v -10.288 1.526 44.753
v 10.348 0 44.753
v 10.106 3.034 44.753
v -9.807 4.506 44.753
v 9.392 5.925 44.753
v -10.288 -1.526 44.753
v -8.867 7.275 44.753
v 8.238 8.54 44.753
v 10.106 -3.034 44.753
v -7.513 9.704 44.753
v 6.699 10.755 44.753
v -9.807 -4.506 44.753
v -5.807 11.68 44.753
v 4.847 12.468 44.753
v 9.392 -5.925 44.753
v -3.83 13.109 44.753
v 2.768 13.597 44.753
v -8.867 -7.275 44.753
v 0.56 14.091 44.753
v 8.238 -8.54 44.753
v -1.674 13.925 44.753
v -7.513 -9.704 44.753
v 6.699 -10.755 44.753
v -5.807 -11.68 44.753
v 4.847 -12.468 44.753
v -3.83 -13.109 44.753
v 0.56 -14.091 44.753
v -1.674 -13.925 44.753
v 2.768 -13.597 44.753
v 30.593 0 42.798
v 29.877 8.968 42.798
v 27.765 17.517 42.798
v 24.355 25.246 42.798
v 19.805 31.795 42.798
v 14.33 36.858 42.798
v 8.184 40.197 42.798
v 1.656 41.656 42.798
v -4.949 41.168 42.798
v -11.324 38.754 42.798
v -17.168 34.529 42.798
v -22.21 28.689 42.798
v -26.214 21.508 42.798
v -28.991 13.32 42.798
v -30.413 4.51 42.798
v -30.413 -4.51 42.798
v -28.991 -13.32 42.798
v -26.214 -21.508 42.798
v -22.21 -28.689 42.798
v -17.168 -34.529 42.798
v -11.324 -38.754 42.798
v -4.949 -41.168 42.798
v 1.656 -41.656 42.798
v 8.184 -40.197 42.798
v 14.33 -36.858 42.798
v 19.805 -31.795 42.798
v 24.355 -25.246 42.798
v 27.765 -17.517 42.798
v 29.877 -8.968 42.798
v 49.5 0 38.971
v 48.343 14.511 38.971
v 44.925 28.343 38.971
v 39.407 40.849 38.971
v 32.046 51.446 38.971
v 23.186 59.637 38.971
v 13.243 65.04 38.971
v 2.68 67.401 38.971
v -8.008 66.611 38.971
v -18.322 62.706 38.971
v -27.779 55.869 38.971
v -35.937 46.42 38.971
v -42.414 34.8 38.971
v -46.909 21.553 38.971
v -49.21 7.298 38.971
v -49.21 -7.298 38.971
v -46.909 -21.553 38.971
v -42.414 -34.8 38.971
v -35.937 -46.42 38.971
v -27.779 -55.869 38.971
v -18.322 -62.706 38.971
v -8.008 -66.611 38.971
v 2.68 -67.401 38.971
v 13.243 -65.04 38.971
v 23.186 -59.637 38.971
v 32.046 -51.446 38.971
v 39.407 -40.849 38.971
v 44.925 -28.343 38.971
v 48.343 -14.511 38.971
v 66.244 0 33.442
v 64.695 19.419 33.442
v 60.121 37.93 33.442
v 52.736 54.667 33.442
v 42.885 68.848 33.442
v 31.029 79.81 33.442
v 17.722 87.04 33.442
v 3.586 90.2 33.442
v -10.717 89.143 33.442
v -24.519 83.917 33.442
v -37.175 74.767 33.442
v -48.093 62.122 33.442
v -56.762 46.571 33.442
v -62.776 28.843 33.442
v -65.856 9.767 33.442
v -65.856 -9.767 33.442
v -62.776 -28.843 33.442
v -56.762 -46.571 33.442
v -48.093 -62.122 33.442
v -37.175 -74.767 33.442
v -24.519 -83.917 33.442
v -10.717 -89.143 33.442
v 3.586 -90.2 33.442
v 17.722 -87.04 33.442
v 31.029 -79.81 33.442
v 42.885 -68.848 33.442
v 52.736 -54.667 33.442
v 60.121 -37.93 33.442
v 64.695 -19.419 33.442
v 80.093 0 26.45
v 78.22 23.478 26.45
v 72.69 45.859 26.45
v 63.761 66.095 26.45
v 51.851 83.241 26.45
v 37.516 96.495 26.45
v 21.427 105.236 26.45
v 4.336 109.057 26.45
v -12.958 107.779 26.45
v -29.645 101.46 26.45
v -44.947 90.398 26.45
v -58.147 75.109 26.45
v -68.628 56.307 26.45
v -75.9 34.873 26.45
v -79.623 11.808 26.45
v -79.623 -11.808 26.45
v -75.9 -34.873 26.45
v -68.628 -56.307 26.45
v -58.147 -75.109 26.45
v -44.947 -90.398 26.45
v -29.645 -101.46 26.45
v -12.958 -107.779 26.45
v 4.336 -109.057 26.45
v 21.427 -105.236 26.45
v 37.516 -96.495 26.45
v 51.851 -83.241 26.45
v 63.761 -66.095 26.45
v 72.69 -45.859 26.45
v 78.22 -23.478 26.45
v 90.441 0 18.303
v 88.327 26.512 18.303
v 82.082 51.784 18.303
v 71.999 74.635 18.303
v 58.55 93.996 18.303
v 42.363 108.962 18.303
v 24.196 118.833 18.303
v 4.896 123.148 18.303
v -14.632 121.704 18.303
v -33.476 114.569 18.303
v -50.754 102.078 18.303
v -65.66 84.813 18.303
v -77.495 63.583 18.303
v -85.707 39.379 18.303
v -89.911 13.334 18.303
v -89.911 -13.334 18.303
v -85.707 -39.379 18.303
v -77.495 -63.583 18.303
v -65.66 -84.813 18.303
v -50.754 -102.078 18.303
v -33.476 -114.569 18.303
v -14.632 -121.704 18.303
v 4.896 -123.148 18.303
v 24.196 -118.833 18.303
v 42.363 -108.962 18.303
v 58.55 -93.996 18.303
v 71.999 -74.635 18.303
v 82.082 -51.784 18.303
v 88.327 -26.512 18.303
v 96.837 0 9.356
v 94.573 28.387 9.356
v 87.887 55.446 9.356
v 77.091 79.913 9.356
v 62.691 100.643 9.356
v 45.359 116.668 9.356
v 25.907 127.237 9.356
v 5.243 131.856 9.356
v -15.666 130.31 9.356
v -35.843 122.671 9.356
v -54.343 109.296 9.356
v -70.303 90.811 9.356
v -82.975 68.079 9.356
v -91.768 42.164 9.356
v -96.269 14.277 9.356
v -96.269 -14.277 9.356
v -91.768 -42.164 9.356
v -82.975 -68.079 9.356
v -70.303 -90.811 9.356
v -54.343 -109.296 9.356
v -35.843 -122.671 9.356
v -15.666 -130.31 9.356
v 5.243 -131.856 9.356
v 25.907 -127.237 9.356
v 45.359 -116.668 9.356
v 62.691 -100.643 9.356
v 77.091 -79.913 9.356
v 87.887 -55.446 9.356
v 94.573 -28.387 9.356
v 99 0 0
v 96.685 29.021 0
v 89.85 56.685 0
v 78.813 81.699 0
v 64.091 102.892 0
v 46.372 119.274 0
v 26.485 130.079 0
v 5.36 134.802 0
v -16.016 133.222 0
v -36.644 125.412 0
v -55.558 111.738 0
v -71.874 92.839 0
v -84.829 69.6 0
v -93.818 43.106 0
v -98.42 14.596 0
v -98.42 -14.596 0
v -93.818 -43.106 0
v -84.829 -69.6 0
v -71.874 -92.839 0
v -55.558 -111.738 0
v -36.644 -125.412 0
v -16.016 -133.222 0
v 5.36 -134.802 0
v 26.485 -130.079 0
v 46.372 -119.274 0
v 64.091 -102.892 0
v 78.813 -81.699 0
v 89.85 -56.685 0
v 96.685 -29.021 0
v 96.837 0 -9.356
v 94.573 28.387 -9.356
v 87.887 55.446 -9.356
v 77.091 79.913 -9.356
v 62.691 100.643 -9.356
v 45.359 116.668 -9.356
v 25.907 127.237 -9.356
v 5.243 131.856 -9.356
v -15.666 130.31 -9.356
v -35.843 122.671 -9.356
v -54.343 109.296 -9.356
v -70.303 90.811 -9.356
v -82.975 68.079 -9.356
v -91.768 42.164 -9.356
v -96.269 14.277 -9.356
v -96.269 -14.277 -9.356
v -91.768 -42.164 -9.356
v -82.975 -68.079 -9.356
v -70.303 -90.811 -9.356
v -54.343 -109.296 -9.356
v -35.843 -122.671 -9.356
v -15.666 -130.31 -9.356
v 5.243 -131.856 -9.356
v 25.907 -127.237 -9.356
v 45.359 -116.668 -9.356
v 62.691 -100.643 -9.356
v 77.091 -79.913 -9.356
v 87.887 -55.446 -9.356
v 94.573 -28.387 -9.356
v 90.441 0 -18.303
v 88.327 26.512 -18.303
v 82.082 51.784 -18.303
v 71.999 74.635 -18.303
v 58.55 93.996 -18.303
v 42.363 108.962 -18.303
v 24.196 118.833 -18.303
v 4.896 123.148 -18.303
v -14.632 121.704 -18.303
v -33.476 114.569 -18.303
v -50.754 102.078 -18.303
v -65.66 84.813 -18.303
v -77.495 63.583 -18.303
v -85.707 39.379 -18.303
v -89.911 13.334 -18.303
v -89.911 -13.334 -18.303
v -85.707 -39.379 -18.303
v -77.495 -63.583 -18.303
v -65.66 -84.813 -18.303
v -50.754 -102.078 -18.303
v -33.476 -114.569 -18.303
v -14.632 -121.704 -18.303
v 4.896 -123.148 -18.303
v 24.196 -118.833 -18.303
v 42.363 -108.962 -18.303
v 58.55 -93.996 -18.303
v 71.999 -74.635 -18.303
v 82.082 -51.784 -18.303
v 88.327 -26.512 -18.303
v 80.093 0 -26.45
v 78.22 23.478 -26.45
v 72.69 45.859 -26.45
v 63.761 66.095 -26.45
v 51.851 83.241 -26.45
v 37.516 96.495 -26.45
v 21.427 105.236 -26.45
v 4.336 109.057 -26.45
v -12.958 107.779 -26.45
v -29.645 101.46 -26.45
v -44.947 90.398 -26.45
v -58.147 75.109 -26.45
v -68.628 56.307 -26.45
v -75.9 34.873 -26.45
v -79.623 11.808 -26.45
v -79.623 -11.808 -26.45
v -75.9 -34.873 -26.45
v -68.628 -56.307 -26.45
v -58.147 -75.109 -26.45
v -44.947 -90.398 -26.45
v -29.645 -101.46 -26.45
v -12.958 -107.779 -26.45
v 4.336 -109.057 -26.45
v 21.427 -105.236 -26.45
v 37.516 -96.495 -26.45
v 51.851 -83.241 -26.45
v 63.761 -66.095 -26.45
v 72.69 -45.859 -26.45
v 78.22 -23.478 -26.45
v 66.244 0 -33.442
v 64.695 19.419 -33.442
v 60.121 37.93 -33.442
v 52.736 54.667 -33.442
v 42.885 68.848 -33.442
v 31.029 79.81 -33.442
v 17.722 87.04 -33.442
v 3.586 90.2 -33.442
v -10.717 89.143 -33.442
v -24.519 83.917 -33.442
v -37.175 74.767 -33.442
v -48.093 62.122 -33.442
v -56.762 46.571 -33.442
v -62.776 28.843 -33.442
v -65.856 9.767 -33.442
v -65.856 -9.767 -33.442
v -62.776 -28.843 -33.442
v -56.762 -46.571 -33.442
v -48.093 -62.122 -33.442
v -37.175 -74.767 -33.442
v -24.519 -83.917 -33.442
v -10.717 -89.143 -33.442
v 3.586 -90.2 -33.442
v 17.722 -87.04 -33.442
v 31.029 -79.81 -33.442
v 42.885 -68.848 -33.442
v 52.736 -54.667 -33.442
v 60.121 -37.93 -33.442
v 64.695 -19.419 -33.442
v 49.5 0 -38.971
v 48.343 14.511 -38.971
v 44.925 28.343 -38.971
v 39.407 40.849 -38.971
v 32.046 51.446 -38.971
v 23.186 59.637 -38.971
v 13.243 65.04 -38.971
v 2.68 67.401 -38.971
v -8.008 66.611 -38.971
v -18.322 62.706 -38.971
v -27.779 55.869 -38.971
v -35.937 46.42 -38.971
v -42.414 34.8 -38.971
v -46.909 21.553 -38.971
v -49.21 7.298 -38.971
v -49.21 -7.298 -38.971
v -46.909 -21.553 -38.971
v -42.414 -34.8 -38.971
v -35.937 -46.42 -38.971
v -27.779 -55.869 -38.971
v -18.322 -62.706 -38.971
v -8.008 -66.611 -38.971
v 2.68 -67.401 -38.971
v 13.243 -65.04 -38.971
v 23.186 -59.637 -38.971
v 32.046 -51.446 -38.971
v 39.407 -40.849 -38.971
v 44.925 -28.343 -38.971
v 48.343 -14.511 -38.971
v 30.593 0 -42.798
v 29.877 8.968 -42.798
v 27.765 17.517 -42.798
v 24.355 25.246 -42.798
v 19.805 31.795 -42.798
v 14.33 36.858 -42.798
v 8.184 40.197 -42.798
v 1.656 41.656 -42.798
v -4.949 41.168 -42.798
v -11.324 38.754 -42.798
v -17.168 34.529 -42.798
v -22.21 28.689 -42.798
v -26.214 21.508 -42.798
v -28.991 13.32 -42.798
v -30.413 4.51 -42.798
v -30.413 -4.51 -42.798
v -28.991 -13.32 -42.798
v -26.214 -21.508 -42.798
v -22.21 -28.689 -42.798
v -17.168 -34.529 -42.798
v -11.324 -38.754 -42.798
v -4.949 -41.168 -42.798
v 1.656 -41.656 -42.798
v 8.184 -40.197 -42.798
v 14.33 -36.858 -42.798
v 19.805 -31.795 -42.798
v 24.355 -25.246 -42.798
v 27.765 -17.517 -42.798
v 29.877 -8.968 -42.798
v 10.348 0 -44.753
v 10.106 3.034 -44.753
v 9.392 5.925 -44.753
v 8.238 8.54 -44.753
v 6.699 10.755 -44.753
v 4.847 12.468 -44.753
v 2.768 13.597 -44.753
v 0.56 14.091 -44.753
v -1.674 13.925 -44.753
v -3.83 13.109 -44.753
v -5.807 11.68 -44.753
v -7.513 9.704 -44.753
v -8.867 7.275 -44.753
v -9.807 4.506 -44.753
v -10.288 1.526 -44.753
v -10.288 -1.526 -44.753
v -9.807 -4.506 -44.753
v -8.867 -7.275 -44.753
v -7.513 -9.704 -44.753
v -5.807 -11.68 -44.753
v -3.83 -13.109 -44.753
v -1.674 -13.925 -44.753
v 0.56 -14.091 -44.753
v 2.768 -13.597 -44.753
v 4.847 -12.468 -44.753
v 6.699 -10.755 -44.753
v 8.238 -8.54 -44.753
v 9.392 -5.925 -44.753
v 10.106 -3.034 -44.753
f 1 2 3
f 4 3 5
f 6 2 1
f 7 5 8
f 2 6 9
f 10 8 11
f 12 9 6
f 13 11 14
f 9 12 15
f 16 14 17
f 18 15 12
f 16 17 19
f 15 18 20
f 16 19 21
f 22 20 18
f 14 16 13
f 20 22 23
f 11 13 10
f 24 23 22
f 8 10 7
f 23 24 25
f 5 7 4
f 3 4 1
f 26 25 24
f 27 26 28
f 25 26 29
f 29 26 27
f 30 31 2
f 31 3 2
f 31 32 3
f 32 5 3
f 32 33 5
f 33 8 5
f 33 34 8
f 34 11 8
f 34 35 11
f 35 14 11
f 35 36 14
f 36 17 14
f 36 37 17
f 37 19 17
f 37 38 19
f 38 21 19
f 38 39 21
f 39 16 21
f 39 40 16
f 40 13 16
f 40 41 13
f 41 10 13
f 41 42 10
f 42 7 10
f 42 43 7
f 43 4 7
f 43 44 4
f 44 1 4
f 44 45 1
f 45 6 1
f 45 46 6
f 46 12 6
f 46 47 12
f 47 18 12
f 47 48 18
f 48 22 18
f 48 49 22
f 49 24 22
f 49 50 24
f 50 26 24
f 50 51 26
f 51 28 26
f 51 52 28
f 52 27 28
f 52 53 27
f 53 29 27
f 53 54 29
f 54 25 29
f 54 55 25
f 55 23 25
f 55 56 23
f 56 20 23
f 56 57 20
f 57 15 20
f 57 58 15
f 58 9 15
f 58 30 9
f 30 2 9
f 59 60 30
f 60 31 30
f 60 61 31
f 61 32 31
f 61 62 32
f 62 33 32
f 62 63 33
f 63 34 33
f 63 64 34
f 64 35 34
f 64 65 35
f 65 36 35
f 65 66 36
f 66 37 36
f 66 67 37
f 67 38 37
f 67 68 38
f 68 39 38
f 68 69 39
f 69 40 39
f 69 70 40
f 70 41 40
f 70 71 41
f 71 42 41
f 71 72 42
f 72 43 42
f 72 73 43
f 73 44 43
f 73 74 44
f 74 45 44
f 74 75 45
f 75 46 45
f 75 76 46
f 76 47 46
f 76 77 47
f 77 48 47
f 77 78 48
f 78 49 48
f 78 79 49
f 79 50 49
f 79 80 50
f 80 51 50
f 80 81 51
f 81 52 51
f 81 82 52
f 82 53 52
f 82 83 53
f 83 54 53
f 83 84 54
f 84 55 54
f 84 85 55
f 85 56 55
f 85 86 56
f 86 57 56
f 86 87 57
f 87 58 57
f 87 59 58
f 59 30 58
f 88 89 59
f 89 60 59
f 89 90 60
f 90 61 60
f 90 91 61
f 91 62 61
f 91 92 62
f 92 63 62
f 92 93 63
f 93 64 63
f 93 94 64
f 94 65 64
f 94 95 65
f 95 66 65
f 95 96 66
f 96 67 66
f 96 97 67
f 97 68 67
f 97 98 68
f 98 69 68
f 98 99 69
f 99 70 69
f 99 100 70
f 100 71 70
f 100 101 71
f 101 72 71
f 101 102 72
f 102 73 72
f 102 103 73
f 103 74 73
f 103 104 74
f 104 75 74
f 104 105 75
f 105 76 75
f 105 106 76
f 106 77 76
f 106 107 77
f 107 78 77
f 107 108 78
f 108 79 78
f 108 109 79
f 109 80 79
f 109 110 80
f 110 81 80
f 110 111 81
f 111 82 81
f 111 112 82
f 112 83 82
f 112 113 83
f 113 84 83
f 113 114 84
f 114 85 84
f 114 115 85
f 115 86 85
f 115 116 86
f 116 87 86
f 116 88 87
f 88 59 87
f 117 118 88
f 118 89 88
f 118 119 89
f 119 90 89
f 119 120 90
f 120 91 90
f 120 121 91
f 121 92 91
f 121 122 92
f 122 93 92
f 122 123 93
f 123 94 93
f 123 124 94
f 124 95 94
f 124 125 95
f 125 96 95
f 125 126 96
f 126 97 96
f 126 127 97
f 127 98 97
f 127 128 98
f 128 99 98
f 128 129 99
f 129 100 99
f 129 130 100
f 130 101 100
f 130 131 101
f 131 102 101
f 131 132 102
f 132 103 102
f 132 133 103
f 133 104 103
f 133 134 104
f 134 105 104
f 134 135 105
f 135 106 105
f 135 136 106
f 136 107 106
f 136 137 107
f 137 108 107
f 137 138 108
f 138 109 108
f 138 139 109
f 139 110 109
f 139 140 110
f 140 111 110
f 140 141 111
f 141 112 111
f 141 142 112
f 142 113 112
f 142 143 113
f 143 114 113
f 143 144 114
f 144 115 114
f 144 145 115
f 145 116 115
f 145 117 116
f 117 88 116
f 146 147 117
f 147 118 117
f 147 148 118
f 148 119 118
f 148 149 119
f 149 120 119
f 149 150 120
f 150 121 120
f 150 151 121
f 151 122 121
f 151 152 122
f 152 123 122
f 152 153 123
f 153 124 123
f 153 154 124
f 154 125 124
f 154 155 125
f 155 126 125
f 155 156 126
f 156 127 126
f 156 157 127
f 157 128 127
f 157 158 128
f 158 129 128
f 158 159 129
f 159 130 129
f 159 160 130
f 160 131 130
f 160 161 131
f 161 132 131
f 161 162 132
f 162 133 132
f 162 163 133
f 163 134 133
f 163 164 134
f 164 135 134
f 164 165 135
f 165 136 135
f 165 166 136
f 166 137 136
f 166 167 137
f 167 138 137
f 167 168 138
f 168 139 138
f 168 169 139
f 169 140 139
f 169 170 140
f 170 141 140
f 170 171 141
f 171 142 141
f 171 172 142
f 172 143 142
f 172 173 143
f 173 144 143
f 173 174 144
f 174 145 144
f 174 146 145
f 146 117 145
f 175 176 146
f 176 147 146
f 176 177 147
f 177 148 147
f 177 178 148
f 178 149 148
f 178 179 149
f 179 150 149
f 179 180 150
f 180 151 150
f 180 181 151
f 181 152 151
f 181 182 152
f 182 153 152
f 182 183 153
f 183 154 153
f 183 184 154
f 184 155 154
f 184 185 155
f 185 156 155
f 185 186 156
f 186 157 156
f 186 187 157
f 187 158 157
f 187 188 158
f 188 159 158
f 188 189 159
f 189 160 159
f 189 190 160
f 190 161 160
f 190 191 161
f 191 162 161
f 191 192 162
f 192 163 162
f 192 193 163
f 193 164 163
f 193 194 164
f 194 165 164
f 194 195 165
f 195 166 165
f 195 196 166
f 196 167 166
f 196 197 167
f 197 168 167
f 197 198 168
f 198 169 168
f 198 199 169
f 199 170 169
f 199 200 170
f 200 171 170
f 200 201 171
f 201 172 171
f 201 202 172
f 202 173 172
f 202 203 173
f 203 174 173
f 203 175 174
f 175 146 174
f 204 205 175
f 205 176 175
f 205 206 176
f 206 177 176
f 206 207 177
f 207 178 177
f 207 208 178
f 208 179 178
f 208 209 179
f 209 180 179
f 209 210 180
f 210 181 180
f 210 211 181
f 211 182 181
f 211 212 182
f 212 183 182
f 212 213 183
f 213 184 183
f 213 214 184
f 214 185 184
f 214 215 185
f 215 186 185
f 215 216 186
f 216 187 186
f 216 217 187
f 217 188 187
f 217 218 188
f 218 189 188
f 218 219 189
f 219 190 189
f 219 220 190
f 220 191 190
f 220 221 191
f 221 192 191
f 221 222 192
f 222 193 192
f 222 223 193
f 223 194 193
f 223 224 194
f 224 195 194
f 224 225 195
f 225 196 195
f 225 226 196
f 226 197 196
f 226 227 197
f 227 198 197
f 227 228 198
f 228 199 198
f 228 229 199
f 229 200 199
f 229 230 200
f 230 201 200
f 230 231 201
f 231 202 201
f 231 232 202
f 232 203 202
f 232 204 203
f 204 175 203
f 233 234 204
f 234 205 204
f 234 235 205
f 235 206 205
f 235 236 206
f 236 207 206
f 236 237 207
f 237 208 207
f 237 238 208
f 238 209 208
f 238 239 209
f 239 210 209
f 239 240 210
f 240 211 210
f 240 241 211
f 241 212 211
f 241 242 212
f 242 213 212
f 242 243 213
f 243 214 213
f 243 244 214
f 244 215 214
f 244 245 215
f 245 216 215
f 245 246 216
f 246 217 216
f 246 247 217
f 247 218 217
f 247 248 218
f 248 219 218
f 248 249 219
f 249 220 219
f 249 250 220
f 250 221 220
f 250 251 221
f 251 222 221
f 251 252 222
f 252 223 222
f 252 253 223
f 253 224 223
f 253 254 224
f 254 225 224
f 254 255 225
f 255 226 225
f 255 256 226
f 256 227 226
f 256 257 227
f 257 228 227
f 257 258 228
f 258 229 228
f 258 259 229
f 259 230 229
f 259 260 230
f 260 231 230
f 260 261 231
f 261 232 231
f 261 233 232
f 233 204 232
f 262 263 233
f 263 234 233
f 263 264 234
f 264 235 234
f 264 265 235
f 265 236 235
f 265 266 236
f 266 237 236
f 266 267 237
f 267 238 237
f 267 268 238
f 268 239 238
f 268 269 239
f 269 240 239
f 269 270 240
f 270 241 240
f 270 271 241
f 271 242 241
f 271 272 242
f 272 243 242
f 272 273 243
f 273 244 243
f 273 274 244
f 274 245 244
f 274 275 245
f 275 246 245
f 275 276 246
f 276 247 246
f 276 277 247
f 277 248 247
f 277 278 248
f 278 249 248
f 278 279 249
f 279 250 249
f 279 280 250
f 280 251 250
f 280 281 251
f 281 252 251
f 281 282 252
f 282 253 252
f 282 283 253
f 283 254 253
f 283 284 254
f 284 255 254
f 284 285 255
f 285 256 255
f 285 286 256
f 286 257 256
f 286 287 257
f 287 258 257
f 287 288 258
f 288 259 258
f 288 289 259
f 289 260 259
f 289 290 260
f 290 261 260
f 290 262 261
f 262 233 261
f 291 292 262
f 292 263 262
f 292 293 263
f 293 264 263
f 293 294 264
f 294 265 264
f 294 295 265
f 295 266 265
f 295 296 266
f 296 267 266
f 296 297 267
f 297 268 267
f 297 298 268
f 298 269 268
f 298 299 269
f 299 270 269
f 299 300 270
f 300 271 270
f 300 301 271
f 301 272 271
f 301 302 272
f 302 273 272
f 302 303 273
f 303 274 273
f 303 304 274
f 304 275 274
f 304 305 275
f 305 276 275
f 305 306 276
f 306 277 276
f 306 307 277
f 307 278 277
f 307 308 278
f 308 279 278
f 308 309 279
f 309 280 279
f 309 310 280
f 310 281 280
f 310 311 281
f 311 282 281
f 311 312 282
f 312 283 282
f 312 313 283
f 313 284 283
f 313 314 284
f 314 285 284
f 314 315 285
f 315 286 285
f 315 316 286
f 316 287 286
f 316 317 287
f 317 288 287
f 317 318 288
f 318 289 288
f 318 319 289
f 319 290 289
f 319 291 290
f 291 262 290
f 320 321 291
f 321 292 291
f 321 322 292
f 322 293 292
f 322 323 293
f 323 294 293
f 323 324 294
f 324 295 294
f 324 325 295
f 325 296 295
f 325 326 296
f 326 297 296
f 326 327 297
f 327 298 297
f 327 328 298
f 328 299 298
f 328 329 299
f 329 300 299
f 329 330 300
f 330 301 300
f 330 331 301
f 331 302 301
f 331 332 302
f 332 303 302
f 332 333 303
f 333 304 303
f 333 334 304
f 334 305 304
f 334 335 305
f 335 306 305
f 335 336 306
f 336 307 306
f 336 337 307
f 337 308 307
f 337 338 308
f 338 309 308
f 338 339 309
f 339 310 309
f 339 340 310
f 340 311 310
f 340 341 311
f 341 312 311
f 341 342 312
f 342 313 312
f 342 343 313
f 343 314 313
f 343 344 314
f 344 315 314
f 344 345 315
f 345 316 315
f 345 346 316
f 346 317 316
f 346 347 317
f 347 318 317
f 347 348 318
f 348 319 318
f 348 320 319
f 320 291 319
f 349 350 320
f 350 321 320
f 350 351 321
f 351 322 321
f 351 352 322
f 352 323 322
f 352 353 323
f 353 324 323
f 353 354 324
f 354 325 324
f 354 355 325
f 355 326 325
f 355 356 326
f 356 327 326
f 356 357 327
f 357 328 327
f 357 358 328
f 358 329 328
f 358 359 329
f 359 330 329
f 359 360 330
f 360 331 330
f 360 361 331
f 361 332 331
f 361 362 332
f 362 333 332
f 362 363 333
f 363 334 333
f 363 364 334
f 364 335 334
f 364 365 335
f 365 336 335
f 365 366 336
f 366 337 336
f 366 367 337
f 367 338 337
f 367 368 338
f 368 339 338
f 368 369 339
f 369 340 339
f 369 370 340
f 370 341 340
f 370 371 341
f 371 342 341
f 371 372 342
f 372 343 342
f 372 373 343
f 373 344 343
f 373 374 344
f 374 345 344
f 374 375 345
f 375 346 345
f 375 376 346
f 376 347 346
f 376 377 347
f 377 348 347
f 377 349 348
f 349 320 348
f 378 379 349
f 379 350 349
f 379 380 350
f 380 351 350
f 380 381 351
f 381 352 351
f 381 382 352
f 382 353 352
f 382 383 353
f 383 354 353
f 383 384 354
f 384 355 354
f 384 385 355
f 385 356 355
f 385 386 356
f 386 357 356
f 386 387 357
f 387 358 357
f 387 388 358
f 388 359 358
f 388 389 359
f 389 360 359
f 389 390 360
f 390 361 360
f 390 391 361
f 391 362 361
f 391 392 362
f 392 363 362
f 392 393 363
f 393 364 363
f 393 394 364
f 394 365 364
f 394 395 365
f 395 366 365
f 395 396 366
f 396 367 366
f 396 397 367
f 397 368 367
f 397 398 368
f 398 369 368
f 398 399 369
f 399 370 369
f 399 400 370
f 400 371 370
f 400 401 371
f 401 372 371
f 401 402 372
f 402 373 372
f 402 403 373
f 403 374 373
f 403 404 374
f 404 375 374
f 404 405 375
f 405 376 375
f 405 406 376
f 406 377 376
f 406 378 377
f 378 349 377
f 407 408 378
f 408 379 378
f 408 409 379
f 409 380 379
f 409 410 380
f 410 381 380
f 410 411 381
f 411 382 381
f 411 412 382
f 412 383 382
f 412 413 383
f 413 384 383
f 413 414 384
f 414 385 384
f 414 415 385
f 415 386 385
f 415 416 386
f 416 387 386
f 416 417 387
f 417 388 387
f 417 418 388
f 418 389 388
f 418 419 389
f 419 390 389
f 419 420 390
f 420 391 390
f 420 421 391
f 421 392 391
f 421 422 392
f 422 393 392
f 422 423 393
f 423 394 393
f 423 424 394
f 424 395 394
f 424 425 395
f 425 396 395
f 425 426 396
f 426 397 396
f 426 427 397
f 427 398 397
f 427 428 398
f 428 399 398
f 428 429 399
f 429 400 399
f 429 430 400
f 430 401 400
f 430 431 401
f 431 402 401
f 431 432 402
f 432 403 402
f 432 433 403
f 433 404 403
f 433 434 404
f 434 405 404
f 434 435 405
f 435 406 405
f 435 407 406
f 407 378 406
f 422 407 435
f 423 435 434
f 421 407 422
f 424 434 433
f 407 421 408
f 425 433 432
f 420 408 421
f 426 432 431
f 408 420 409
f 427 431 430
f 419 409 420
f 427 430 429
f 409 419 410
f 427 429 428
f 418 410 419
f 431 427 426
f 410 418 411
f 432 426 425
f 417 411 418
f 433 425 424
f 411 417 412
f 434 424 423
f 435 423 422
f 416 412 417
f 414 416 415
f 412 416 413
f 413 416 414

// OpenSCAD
// Generated by SolidPython 1.0.1 on 2020-07-29 00:46:50


scale(v = [11, 15, 5]) {
	sphere(r = 9);
}
/***********************************************
*********      SolidPython code:      **********
************************************************
 
# import packages: SolidPython
from solid import *
from solid.utils import *
from itertools import chain, combinations, permutations


class Resize:

    def __init__(self, scad_file):
        self.scad_file = scad_file
        #self.scad_file = import_scad(scad_file)
        # cone/cylinder param:
        self.r1 = 0
        self.r2 = 0
        self.h = 0
        # rectangular prism param:
        self.w = 0
        self.l = 0
        # ellipse param:
        self.r = 0

    # import OpenScad code (file name corresponds to shape)


    # classify shape + parameters
    def assign(self, param1, param2, param3):
        if self.scad_file == 'cone.scad':
            self.r1 = param1
            self.r2 = param2
            self.h = param3
        elif self.scad_file == 'cylinder.scad':
            self.r1 = param1
            self.r2 = param2
            self.h = param3
        elif self.scad_file == 'rectangularPrism.scad':
            self.h = param1
            self.l = param2
            self.w = param3
        else:
            self.r = param1
            self.h = param2

    # resize parameters
    def iterate(self):
        x = range(3, 20, 2)
        i = 1
        if self.scad_file == 'cone.scad':
            tempList = list(permutations(x, 2))
            for temp in tempList:
                param1 = temp[0]
                param2 = temp[1]
                filepath = 'produced_scad_files/' + 'cone' + str(param1) + '_' + str(param2) + '_' + '.scad'
                scad_render_to_file(cylinder(h=param1, r1=param2, r2=0), filepath)

        elif self.scad_file == 'cylinder.scad':
            tempList = list(permutations(x, 3))
            for temp in tempList:
                param1 = temp[0]
                param2 = temp[1]
                filepath = 'produced_scad_files/' + 'cylinder' + str(param1) + '_' + str(param2) + '_' + '.scad'
                scad_render_to_file(cylinder(h=param1, r1=param2, r2=param2), filepath)

        elif self.scad_file == 'rectangularPrism.scad':
            tempList = list(permutations(x, 3))
            for temp in tempList:
                param1 = temp[0]
                param2 = temp[1]
                param3 = temp[2]
                filepath = 'produced_scad_files/' + 'rectangularPrism' + str(param1) + '_' + str(param2) + '_' + str(
                    param3) + '.scad'
                scad_render_to_file(cube(size=(param1, param2, param3)), filepath)

        elif self.scad_file == 'ellipse.scad':
            tempList = list(permutations(x, 4))
            for temp in tempList:
                param1 = temp[0]
                param2 = temp[1]
                param3 = temp[2]
                param4 = temp[3]
                filepath = 'produced_scad_files/' + 'ellipse' + str(param1) + '_' + str(param2) + '_' + str(param3) + '_' + str(param4) + '.scad'
                scad_render_to_file(scale([param1, param2, param3])(sphere(r=param4)), filepath)

    def render_to_scadfile(self):
        scad_render_to_file(scad, 'example.scad') 
 
************************************************/
